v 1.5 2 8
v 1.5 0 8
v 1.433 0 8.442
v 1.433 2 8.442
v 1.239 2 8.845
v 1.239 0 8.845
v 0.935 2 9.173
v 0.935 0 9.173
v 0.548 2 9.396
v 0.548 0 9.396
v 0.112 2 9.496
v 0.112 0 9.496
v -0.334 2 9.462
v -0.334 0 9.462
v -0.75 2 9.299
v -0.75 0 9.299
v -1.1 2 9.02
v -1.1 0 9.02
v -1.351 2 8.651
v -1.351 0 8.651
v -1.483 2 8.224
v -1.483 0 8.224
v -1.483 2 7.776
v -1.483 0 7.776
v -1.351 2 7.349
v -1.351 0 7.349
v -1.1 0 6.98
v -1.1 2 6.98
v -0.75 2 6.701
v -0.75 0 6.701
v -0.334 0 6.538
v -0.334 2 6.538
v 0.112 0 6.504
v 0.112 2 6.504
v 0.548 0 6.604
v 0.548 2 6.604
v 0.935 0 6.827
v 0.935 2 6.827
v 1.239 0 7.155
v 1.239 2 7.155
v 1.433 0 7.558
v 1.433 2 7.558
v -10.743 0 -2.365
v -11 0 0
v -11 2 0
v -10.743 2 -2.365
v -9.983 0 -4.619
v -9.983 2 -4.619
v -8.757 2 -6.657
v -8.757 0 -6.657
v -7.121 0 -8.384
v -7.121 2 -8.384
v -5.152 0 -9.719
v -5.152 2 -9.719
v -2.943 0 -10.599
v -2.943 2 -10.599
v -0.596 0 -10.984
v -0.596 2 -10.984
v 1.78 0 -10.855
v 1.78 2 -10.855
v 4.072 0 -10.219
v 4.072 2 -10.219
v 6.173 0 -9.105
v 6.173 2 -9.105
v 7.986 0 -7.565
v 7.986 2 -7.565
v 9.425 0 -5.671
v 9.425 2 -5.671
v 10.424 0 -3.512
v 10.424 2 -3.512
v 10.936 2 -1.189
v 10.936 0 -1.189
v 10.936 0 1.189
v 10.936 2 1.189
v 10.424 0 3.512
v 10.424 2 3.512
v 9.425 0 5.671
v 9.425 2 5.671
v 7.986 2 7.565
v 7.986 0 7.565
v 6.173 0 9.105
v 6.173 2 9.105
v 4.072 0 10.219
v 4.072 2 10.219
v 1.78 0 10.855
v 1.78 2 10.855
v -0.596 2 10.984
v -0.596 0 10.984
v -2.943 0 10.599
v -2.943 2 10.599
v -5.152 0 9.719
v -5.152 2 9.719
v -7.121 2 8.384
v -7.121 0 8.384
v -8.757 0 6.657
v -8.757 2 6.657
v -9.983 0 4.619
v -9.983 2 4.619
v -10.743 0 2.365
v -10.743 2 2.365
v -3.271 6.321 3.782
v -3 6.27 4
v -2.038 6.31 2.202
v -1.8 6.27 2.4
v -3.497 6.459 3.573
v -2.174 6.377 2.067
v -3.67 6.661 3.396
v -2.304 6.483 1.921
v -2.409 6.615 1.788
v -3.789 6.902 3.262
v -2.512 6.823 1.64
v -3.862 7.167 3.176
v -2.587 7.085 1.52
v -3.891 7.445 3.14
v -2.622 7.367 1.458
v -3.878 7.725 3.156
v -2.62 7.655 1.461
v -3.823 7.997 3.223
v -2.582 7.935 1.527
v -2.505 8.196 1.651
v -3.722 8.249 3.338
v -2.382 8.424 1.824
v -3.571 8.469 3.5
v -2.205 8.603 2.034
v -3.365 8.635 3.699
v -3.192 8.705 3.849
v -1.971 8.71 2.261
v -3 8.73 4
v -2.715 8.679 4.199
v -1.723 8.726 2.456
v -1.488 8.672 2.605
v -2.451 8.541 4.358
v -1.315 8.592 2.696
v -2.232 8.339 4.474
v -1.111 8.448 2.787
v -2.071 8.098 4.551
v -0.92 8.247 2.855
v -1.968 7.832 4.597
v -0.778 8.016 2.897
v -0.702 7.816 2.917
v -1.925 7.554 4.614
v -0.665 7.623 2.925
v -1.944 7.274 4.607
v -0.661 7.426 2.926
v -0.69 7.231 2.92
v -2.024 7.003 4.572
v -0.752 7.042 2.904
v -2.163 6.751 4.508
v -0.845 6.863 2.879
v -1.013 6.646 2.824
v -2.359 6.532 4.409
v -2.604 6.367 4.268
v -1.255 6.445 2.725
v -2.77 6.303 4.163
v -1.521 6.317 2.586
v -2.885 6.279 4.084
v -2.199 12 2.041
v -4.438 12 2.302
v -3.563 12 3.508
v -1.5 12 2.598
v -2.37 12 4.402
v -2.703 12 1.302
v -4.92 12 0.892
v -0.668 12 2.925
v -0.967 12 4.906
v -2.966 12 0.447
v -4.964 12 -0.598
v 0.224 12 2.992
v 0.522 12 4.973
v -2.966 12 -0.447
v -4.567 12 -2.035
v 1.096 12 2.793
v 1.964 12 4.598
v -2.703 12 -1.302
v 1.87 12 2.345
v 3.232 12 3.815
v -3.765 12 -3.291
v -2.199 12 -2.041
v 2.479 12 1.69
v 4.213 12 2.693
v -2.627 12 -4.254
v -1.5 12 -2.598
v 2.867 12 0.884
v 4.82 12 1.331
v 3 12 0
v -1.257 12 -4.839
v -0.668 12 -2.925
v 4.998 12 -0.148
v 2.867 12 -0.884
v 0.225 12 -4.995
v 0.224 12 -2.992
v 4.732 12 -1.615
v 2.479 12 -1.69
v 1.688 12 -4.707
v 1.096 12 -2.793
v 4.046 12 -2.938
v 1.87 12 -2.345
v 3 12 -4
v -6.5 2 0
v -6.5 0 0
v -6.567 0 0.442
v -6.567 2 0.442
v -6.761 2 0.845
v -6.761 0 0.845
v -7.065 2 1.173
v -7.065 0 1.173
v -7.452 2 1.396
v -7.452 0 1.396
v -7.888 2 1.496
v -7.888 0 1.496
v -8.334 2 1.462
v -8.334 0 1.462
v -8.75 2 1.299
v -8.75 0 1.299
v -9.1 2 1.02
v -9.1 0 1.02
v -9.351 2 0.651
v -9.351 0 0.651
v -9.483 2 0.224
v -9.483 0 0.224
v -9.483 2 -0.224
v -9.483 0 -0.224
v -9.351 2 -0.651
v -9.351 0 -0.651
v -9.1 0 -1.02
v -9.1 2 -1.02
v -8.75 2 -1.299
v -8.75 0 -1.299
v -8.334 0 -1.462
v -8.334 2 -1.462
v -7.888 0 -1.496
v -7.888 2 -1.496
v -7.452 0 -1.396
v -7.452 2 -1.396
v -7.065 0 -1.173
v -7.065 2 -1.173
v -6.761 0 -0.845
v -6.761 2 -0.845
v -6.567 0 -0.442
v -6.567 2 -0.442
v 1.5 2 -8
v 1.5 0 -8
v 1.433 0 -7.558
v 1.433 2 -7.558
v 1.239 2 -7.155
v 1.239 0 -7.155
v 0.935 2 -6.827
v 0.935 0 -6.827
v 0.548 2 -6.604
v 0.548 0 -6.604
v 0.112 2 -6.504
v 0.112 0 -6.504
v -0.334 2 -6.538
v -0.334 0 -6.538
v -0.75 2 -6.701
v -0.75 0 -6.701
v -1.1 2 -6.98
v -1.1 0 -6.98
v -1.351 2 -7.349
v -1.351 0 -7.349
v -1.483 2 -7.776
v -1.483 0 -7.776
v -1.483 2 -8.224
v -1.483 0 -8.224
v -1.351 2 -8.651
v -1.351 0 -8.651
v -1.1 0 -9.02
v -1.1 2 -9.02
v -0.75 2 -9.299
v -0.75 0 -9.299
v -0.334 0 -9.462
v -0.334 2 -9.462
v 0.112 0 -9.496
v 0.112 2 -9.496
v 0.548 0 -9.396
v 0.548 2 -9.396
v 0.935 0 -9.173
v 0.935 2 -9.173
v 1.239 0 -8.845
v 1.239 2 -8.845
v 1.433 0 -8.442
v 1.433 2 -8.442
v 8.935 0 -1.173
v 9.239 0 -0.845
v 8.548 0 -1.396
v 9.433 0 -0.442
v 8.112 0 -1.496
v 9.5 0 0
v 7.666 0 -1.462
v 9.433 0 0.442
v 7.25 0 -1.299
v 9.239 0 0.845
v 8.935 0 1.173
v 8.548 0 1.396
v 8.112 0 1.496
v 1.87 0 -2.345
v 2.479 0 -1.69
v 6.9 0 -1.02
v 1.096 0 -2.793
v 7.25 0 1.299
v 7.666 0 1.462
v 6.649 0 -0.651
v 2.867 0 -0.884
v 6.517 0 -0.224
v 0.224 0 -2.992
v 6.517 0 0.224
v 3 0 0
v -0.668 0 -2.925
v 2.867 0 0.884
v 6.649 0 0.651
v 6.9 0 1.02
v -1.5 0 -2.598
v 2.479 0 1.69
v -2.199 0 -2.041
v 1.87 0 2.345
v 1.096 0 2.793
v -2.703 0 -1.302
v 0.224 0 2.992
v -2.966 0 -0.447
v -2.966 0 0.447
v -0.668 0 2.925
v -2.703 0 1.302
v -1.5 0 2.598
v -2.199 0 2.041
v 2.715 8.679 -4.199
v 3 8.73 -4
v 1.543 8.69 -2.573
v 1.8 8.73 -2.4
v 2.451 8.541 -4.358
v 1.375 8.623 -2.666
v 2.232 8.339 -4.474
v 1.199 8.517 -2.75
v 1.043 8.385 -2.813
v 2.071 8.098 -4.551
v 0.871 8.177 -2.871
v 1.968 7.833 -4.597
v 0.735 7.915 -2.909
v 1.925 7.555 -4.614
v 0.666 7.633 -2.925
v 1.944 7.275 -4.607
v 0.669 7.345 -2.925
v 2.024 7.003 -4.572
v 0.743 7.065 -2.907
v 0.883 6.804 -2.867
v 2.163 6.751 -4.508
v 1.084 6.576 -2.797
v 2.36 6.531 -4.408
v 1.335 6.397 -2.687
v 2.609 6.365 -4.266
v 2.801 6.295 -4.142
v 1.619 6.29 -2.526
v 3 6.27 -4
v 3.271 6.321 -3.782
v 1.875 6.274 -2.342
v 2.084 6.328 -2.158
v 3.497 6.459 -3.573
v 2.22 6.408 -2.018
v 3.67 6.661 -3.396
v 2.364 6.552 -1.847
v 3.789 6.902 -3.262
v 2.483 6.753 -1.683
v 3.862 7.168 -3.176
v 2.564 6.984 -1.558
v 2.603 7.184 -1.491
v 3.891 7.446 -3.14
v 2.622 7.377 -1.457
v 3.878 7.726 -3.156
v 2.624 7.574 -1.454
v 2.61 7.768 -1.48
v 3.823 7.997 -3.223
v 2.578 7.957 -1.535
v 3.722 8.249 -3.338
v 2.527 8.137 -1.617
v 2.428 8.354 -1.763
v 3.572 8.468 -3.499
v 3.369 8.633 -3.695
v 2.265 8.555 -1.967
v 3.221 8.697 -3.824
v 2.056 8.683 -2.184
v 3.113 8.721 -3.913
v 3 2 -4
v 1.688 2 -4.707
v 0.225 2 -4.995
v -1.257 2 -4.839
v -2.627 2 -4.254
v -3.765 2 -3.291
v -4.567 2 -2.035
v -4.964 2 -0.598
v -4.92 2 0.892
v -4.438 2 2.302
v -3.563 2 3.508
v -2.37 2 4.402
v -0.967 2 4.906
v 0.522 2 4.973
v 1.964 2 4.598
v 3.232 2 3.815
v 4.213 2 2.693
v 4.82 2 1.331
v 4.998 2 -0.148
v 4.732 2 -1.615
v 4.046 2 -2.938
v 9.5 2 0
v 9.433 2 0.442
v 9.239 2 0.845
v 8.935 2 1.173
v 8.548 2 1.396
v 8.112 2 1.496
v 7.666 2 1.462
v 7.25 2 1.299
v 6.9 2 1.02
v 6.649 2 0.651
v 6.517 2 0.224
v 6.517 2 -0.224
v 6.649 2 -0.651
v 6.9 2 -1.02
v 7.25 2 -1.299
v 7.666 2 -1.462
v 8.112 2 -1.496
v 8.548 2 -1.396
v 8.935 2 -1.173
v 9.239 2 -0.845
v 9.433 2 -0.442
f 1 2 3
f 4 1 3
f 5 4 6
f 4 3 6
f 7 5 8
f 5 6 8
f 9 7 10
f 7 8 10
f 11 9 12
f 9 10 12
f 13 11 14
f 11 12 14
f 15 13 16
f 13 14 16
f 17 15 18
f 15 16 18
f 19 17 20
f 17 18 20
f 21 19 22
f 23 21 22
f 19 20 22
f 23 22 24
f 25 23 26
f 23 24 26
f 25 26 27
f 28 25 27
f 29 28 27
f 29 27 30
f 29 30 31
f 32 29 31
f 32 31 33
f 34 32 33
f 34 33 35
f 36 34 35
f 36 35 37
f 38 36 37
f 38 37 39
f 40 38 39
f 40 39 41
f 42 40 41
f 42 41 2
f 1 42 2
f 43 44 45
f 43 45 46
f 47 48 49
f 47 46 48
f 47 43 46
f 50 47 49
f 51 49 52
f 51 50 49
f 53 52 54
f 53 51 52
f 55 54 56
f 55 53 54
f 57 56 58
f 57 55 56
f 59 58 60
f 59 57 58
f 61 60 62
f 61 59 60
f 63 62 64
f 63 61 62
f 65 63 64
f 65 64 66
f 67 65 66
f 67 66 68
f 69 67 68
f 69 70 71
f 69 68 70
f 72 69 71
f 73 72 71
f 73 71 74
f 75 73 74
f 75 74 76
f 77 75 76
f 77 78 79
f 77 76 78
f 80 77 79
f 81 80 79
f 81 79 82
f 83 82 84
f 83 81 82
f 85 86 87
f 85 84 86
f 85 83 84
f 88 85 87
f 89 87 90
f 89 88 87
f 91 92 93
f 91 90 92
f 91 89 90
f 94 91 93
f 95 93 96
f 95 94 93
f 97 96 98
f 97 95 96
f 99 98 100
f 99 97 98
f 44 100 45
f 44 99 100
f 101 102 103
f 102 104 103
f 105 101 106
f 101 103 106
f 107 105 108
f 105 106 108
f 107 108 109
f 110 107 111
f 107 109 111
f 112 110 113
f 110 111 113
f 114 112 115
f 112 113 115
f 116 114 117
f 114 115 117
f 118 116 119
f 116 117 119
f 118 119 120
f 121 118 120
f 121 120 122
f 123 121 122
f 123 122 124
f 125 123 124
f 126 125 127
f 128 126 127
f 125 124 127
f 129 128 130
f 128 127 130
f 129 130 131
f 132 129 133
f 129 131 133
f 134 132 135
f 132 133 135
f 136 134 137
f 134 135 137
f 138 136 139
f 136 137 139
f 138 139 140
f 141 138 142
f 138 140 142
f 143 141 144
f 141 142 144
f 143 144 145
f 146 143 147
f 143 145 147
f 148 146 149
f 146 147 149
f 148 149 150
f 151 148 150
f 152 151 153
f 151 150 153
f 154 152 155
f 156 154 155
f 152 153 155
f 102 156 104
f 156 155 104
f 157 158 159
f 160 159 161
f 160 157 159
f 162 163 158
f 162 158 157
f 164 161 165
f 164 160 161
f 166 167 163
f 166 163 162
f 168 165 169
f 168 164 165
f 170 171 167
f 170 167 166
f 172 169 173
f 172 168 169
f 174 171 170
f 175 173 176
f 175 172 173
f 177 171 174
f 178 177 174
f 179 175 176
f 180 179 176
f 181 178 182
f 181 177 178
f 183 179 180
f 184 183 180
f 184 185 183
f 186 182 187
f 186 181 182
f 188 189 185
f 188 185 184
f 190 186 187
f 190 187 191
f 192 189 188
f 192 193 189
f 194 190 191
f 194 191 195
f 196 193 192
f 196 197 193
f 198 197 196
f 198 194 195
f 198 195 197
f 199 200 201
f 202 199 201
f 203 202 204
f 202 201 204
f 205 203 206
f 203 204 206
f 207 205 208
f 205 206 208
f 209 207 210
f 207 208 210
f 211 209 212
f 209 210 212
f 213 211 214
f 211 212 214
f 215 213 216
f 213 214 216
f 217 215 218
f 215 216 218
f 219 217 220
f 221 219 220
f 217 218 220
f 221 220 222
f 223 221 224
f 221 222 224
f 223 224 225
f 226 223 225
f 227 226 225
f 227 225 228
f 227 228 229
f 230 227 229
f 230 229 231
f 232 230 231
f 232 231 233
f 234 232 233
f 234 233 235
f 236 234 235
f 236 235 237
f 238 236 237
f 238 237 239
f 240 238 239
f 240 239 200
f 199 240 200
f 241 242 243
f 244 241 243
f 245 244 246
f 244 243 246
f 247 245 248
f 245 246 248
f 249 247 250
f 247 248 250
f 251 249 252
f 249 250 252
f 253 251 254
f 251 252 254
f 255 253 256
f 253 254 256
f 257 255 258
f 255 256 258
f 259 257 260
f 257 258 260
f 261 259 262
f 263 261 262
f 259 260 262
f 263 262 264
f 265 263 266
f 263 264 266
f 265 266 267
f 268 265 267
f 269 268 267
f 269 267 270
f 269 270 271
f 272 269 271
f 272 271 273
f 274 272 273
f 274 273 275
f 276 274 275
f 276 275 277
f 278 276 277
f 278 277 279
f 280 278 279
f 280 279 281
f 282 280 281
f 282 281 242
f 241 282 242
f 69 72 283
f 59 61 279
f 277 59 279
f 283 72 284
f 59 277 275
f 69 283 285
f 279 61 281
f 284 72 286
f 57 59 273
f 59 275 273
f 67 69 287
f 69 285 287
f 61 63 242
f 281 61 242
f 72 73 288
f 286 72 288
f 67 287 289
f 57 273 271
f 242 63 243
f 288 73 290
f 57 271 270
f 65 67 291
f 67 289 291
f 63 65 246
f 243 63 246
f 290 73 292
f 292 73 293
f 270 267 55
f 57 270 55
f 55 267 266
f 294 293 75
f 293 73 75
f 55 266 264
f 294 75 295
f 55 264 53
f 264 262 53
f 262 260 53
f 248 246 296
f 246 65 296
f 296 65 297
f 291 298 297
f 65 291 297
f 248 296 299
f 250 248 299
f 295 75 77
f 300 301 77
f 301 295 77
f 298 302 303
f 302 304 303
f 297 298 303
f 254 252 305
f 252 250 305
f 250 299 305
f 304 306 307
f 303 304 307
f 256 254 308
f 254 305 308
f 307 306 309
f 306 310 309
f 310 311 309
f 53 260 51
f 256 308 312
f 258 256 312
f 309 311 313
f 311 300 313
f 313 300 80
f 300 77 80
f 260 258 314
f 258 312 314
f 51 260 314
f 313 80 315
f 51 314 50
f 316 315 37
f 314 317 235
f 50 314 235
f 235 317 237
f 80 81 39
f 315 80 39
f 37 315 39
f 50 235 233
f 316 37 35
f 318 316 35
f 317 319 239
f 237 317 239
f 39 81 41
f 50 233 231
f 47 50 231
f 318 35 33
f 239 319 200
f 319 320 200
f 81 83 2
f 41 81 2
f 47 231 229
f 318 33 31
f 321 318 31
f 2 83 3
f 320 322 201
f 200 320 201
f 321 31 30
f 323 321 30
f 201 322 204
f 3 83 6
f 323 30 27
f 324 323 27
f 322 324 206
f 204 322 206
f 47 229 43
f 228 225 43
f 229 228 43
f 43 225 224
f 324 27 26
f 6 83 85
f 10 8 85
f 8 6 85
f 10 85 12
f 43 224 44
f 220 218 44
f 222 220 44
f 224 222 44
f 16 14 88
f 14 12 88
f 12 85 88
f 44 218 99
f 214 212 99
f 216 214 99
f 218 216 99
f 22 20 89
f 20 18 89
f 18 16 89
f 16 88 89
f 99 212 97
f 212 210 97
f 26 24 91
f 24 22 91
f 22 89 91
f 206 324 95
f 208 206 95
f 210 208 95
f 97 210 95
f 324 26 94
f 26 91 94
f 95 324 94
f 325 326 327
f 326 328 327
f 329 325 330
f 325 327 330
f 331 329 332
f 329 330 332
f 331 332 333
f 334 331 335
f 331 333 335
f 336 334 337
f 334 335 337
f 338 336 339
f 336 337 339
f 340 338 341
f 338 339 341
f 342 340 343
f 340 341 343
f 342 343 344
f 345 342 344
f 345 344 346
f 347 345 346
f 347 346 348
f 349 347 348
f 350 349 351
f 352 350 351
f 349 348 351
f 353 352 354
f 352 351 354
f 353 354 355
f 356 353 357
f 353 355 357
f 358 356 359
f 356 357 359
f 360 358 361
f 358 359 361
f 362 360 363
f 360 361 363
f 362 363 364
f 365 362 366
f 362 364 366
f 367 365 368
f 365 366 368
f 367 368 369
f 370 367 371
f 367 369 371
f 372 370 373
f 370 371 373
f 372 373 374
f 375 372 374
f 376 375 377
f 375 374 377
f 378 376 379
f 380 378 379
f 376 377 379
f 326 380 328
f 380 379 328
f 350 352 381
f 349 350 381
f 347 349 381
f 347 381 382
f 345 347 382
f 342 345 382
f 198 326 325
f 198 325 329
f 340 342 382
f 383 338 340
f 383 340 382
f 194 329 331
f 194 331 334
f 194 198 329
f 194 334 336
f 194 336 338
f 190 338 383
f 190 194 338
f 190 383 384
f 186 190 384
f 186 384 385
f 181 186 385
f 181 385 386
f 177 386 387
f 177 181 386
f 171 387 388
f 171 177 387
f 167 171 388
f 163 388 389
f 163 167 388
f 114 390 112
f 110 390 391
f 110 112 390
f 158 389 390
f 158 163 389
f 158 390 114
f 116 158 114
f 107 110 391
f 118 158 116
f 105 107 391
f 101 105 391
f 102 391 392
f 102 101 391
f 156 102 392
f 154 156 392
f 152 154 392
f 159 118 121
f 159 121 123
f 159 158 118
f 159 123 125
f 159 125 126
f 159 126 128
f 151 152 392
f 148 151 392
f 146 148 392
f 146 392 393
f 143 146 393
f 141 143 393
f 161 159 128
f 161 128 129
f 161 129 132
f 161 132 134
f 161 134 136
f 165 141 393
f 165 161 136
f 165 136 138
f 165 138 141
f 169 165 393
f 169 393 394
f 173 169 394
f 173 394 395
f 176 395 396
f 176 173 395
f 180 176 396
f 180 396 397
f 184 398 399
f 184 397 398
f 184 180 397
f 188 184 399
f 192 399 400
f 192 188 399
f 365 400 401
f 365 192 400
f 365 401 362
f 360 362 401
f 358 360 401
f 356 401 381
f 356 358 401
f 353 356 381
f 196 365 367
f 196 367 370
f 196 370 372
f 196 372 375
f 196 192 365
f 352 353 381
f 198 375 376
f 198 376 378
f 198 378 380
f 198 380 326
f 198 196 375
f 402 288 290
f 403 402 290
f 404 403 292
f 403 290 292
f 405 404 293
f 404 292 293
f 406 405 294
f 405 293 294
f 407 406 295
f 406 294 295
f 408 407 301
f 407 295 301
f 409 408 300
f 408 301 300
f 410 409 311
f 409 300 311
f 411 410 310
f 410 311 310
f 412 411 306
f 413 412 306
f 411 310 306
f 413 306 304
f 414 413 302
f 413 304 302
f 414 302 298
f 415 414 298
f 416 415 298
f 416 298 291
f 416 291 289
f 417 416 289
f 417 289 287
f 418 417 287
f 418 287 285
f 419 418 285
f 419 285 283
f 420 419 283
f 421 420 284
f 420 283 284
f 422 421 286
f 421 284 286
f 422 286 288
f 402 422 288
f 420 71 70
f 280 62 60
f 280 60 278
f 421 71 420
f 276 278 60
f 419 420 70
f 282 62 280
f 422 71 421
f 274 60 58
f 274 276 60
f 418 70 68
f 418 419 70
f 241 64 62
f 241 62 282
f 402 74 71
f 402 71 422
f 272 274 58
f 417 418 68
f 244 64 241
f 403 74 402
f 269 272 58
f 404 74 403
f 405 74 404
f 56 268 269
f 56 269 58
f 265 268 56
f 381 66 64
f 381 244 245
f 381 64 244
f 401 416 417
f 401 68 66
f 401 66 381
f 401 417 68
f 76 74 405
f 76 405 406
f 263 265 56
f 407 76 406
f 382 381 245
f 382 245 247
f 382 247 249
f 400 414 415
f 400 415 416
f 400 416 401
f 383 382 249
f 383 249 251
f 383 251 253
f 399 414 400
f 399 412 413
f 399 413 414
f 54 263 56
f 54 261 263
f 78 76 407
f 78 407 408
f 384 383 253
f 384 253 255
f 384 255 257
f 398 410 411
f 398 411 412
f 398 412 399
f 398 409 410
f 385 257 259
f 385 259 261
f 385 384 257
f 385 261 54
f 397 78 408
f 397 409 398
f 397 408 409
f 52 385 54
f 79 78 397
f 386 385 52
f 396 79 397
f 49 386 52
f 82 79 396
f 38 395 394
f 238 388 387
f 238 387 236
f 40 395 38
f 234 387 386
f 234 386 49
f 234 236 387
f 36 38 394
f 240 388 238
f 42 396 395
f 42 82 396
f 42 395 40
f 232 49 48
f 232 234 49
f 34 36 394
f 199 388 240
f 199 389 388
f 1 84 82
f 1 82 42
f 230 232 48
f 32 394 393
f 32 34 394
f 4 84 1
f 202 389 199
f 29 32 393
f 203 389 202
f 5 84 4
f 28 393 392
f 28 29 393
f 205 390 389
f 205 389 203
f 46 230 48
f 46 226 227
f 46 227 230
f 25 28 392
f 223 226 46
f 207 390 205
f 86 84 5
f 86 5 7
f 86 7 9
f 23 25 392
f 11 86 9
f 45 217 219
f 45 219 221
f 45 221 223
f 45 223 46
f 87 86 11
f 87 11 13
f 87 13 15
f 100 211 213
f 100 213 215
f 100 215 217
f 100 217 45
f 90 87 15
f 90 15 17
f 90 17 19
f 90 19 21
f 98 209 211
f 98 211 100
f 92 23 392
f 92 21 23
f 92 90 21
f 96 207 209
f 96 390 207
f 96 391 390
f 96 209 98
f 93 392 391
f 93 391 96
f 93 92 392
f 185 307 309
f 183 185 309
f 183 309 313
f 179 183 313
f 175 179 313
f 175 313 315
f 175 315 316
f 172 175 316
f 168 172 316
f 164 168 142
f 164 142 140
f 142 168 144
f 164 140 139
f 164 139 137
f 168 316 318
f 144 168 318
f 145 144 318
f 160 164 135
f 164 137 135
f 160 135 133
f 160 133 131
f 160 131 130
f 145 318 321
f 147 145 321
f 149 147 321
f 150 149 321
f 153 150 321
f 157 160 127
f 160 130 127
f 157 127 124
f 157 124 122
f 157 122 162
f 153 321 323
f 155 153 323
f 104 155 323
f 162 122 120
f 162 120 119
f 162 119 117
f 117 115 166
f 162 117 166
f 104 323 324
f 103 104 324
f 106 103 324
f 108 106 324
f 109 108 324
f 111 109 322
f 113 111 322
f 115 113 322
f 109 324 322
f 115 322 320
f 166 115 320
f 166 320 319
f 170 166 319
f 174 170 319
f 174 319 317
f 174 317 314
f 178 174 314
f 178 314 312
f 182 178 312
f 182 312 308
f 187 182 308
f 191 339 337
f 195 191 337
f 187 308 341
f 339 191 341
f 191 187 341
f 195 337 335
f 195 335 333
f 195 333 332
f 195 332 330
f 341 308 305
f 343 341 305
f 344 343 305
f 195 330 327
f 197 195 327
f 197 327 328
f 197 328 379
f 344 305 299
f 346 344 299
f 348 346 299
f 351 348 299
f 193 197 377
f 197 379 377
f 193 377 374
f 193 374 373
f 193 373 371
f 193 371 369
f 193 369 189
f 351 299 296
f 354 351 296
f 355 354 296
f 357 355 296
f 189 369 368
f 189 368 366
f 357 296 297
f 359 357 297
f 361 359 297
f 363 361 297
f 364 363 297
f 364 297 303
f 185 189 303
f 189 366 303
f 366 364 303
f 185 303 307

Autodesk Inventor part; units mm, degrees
ref_plane "YZ Plane" through (0, 0, 0) normal (1, 0, 0) x (0, 1, 0)
ref_plane "XZ Plane" through (0, 0, 0) normal (0, 1, 0) x (-1, 0, 0)
ref_plane "XY Plane" through (0, 0, 0) normal (0, 0, 1) x (1, 0, 0)
sketch "Schizzo1" plane through (0, 0, 0) normal (0, 1, 0) x (-1, 0, 0)
  circle A0 centre (0, 0) radius 11
  dimension "d0" = 22
extrude "Estrusione1" add sketch "Schizzo1" along normal blind 2
sketch "Schizzo2" plane through (0, 2, 0) normal (0, 1, 0) x (1, 0, 0)
  circle A0 centre (0, 0) radius 5
  line L0 (-7, -1) -> (-1, 7)
  line L1 (-1, 7) -> (7, 1)
  line L2 (7, 1) -> (1, -7)
  line L3 (1, -7) -> (-7, -1)
  point P0 (-3, -4)
  point P1 (4, -3)
  point P2 (-4, 3)
  point P3 (3, 4)
  dimension "d3" = 10
extrude "Estrusione2" add sketch "Schizzo2" along normal blind 10
sketch "Schizzo3" plane through (0, 0, 0) normal (0, -1, 0) x (1, 0, 0)
  circle A0 centre (0, 0) radius 2
  circle A1 centre (-8, 0) radius 1.5
  line L0 (0, -8) -> (0, 8)
  line L1 (-8, 0) -> (8, 0)
  circle A2 centre (0, -8) radius 1.5
  circle A3 centre (8, 0) radius 1.5
  circle A4 centre (0, 8) radius 1.5
  dimension "d6" = 4
  dimension "d7" = 3
  dimension "d8" = 16
  dimension "d9" = 16
  dimension "d10" = 3
  dimension "d11" = 3
  dimension "d12" = 3
extrude "Estrusione3" cut sketch "Schizzo3" against normal blind 2 contours A2 | A1 | A4 | A3
sketch "Schizzo4" plane through (0, 0, 0) normal (0, -1, 0) x (1, 0, 0)
  circle A0 centre (0, 0) radius 3
  dimension "d15" = 6
extrude "Estrusione4" cut sketch "Schizzo4" against normal blind 12
sketch "Schizzo5" plane through (1, 2, 7) normal (-0.6, 0, 0.8) x (0.8, 0, 0.6)
  line L0 (-0.7385, 0) -> (-9.9134, 0) projected
  line L1 (-5, 0) -> (-5, 4)
  line L2 (-5, 0) -> (-1, 0) construction
  line L3 (-5, 4) -> (-5, 5.5)
  point P0 (-5, -2)
  dimension "d19" = 4
  dimension "d20" = 90
  dimension "d21" = 1.5
  dimension "d22" = 180
hole "Foro1" at (-3, 7.5, 4) direction (0.6, 0, -0.8) diameter 2.459 depth 6 tip angle 118 thread size "M3x0.5" class "6H" standard "ISO Metric profile"
sketch "Schizzo7" plane through (-1, 2, -7) normal (0.6, 0, -0.8) x (-0.8, 0, -0.6)
  circle A0 centre (-5, 5.5) radius 1.2295 projected
  circle A1 centre (-5, 5.5) radius 1.2295
  point P0 (-5, -2)
  point P1 (-6.2295, 5.5)
hole "Foro2" at (3, 7.5, -4) direction (-0.6, 0, 0.8) diameter 2.459 depth 6 tip angle 118 thread size "M3x0.5" class "6H" standard "ISO Metric profile"
sketch "Schizzo6" plane through (0, 12, 0) normal (0, 1, 0) x (1, 0, 0)
  circle A0 centre (0, 0) radius 5
  circle A1 centre (0, 0) radius 3 projected
  line L0 (-1, 7) -> (-7, -1) projected
  line L1 (-1, 7) -> (7, 1)
  line L2 (7, 1) -> (1, -7)
  line L3 (1, -7) -> (-7, -1)
  line L4 (-7, -1) -> (-1, 7)
  point P0 (-4, 3)
  point P1 (-3, -4)
  point P2 (4, -3)
  point P3 (-4, 3)
  point P4 (3, 4)
extrude "Estrusione5" cut sketch "Schizzo6" against normal blind 10 contours A0 L1 L2 | A0 L0 L1 | L2 L3 A0 | A0 L3 L0
properties part number "9_Flangia" material "Acciaio, Dolce"
